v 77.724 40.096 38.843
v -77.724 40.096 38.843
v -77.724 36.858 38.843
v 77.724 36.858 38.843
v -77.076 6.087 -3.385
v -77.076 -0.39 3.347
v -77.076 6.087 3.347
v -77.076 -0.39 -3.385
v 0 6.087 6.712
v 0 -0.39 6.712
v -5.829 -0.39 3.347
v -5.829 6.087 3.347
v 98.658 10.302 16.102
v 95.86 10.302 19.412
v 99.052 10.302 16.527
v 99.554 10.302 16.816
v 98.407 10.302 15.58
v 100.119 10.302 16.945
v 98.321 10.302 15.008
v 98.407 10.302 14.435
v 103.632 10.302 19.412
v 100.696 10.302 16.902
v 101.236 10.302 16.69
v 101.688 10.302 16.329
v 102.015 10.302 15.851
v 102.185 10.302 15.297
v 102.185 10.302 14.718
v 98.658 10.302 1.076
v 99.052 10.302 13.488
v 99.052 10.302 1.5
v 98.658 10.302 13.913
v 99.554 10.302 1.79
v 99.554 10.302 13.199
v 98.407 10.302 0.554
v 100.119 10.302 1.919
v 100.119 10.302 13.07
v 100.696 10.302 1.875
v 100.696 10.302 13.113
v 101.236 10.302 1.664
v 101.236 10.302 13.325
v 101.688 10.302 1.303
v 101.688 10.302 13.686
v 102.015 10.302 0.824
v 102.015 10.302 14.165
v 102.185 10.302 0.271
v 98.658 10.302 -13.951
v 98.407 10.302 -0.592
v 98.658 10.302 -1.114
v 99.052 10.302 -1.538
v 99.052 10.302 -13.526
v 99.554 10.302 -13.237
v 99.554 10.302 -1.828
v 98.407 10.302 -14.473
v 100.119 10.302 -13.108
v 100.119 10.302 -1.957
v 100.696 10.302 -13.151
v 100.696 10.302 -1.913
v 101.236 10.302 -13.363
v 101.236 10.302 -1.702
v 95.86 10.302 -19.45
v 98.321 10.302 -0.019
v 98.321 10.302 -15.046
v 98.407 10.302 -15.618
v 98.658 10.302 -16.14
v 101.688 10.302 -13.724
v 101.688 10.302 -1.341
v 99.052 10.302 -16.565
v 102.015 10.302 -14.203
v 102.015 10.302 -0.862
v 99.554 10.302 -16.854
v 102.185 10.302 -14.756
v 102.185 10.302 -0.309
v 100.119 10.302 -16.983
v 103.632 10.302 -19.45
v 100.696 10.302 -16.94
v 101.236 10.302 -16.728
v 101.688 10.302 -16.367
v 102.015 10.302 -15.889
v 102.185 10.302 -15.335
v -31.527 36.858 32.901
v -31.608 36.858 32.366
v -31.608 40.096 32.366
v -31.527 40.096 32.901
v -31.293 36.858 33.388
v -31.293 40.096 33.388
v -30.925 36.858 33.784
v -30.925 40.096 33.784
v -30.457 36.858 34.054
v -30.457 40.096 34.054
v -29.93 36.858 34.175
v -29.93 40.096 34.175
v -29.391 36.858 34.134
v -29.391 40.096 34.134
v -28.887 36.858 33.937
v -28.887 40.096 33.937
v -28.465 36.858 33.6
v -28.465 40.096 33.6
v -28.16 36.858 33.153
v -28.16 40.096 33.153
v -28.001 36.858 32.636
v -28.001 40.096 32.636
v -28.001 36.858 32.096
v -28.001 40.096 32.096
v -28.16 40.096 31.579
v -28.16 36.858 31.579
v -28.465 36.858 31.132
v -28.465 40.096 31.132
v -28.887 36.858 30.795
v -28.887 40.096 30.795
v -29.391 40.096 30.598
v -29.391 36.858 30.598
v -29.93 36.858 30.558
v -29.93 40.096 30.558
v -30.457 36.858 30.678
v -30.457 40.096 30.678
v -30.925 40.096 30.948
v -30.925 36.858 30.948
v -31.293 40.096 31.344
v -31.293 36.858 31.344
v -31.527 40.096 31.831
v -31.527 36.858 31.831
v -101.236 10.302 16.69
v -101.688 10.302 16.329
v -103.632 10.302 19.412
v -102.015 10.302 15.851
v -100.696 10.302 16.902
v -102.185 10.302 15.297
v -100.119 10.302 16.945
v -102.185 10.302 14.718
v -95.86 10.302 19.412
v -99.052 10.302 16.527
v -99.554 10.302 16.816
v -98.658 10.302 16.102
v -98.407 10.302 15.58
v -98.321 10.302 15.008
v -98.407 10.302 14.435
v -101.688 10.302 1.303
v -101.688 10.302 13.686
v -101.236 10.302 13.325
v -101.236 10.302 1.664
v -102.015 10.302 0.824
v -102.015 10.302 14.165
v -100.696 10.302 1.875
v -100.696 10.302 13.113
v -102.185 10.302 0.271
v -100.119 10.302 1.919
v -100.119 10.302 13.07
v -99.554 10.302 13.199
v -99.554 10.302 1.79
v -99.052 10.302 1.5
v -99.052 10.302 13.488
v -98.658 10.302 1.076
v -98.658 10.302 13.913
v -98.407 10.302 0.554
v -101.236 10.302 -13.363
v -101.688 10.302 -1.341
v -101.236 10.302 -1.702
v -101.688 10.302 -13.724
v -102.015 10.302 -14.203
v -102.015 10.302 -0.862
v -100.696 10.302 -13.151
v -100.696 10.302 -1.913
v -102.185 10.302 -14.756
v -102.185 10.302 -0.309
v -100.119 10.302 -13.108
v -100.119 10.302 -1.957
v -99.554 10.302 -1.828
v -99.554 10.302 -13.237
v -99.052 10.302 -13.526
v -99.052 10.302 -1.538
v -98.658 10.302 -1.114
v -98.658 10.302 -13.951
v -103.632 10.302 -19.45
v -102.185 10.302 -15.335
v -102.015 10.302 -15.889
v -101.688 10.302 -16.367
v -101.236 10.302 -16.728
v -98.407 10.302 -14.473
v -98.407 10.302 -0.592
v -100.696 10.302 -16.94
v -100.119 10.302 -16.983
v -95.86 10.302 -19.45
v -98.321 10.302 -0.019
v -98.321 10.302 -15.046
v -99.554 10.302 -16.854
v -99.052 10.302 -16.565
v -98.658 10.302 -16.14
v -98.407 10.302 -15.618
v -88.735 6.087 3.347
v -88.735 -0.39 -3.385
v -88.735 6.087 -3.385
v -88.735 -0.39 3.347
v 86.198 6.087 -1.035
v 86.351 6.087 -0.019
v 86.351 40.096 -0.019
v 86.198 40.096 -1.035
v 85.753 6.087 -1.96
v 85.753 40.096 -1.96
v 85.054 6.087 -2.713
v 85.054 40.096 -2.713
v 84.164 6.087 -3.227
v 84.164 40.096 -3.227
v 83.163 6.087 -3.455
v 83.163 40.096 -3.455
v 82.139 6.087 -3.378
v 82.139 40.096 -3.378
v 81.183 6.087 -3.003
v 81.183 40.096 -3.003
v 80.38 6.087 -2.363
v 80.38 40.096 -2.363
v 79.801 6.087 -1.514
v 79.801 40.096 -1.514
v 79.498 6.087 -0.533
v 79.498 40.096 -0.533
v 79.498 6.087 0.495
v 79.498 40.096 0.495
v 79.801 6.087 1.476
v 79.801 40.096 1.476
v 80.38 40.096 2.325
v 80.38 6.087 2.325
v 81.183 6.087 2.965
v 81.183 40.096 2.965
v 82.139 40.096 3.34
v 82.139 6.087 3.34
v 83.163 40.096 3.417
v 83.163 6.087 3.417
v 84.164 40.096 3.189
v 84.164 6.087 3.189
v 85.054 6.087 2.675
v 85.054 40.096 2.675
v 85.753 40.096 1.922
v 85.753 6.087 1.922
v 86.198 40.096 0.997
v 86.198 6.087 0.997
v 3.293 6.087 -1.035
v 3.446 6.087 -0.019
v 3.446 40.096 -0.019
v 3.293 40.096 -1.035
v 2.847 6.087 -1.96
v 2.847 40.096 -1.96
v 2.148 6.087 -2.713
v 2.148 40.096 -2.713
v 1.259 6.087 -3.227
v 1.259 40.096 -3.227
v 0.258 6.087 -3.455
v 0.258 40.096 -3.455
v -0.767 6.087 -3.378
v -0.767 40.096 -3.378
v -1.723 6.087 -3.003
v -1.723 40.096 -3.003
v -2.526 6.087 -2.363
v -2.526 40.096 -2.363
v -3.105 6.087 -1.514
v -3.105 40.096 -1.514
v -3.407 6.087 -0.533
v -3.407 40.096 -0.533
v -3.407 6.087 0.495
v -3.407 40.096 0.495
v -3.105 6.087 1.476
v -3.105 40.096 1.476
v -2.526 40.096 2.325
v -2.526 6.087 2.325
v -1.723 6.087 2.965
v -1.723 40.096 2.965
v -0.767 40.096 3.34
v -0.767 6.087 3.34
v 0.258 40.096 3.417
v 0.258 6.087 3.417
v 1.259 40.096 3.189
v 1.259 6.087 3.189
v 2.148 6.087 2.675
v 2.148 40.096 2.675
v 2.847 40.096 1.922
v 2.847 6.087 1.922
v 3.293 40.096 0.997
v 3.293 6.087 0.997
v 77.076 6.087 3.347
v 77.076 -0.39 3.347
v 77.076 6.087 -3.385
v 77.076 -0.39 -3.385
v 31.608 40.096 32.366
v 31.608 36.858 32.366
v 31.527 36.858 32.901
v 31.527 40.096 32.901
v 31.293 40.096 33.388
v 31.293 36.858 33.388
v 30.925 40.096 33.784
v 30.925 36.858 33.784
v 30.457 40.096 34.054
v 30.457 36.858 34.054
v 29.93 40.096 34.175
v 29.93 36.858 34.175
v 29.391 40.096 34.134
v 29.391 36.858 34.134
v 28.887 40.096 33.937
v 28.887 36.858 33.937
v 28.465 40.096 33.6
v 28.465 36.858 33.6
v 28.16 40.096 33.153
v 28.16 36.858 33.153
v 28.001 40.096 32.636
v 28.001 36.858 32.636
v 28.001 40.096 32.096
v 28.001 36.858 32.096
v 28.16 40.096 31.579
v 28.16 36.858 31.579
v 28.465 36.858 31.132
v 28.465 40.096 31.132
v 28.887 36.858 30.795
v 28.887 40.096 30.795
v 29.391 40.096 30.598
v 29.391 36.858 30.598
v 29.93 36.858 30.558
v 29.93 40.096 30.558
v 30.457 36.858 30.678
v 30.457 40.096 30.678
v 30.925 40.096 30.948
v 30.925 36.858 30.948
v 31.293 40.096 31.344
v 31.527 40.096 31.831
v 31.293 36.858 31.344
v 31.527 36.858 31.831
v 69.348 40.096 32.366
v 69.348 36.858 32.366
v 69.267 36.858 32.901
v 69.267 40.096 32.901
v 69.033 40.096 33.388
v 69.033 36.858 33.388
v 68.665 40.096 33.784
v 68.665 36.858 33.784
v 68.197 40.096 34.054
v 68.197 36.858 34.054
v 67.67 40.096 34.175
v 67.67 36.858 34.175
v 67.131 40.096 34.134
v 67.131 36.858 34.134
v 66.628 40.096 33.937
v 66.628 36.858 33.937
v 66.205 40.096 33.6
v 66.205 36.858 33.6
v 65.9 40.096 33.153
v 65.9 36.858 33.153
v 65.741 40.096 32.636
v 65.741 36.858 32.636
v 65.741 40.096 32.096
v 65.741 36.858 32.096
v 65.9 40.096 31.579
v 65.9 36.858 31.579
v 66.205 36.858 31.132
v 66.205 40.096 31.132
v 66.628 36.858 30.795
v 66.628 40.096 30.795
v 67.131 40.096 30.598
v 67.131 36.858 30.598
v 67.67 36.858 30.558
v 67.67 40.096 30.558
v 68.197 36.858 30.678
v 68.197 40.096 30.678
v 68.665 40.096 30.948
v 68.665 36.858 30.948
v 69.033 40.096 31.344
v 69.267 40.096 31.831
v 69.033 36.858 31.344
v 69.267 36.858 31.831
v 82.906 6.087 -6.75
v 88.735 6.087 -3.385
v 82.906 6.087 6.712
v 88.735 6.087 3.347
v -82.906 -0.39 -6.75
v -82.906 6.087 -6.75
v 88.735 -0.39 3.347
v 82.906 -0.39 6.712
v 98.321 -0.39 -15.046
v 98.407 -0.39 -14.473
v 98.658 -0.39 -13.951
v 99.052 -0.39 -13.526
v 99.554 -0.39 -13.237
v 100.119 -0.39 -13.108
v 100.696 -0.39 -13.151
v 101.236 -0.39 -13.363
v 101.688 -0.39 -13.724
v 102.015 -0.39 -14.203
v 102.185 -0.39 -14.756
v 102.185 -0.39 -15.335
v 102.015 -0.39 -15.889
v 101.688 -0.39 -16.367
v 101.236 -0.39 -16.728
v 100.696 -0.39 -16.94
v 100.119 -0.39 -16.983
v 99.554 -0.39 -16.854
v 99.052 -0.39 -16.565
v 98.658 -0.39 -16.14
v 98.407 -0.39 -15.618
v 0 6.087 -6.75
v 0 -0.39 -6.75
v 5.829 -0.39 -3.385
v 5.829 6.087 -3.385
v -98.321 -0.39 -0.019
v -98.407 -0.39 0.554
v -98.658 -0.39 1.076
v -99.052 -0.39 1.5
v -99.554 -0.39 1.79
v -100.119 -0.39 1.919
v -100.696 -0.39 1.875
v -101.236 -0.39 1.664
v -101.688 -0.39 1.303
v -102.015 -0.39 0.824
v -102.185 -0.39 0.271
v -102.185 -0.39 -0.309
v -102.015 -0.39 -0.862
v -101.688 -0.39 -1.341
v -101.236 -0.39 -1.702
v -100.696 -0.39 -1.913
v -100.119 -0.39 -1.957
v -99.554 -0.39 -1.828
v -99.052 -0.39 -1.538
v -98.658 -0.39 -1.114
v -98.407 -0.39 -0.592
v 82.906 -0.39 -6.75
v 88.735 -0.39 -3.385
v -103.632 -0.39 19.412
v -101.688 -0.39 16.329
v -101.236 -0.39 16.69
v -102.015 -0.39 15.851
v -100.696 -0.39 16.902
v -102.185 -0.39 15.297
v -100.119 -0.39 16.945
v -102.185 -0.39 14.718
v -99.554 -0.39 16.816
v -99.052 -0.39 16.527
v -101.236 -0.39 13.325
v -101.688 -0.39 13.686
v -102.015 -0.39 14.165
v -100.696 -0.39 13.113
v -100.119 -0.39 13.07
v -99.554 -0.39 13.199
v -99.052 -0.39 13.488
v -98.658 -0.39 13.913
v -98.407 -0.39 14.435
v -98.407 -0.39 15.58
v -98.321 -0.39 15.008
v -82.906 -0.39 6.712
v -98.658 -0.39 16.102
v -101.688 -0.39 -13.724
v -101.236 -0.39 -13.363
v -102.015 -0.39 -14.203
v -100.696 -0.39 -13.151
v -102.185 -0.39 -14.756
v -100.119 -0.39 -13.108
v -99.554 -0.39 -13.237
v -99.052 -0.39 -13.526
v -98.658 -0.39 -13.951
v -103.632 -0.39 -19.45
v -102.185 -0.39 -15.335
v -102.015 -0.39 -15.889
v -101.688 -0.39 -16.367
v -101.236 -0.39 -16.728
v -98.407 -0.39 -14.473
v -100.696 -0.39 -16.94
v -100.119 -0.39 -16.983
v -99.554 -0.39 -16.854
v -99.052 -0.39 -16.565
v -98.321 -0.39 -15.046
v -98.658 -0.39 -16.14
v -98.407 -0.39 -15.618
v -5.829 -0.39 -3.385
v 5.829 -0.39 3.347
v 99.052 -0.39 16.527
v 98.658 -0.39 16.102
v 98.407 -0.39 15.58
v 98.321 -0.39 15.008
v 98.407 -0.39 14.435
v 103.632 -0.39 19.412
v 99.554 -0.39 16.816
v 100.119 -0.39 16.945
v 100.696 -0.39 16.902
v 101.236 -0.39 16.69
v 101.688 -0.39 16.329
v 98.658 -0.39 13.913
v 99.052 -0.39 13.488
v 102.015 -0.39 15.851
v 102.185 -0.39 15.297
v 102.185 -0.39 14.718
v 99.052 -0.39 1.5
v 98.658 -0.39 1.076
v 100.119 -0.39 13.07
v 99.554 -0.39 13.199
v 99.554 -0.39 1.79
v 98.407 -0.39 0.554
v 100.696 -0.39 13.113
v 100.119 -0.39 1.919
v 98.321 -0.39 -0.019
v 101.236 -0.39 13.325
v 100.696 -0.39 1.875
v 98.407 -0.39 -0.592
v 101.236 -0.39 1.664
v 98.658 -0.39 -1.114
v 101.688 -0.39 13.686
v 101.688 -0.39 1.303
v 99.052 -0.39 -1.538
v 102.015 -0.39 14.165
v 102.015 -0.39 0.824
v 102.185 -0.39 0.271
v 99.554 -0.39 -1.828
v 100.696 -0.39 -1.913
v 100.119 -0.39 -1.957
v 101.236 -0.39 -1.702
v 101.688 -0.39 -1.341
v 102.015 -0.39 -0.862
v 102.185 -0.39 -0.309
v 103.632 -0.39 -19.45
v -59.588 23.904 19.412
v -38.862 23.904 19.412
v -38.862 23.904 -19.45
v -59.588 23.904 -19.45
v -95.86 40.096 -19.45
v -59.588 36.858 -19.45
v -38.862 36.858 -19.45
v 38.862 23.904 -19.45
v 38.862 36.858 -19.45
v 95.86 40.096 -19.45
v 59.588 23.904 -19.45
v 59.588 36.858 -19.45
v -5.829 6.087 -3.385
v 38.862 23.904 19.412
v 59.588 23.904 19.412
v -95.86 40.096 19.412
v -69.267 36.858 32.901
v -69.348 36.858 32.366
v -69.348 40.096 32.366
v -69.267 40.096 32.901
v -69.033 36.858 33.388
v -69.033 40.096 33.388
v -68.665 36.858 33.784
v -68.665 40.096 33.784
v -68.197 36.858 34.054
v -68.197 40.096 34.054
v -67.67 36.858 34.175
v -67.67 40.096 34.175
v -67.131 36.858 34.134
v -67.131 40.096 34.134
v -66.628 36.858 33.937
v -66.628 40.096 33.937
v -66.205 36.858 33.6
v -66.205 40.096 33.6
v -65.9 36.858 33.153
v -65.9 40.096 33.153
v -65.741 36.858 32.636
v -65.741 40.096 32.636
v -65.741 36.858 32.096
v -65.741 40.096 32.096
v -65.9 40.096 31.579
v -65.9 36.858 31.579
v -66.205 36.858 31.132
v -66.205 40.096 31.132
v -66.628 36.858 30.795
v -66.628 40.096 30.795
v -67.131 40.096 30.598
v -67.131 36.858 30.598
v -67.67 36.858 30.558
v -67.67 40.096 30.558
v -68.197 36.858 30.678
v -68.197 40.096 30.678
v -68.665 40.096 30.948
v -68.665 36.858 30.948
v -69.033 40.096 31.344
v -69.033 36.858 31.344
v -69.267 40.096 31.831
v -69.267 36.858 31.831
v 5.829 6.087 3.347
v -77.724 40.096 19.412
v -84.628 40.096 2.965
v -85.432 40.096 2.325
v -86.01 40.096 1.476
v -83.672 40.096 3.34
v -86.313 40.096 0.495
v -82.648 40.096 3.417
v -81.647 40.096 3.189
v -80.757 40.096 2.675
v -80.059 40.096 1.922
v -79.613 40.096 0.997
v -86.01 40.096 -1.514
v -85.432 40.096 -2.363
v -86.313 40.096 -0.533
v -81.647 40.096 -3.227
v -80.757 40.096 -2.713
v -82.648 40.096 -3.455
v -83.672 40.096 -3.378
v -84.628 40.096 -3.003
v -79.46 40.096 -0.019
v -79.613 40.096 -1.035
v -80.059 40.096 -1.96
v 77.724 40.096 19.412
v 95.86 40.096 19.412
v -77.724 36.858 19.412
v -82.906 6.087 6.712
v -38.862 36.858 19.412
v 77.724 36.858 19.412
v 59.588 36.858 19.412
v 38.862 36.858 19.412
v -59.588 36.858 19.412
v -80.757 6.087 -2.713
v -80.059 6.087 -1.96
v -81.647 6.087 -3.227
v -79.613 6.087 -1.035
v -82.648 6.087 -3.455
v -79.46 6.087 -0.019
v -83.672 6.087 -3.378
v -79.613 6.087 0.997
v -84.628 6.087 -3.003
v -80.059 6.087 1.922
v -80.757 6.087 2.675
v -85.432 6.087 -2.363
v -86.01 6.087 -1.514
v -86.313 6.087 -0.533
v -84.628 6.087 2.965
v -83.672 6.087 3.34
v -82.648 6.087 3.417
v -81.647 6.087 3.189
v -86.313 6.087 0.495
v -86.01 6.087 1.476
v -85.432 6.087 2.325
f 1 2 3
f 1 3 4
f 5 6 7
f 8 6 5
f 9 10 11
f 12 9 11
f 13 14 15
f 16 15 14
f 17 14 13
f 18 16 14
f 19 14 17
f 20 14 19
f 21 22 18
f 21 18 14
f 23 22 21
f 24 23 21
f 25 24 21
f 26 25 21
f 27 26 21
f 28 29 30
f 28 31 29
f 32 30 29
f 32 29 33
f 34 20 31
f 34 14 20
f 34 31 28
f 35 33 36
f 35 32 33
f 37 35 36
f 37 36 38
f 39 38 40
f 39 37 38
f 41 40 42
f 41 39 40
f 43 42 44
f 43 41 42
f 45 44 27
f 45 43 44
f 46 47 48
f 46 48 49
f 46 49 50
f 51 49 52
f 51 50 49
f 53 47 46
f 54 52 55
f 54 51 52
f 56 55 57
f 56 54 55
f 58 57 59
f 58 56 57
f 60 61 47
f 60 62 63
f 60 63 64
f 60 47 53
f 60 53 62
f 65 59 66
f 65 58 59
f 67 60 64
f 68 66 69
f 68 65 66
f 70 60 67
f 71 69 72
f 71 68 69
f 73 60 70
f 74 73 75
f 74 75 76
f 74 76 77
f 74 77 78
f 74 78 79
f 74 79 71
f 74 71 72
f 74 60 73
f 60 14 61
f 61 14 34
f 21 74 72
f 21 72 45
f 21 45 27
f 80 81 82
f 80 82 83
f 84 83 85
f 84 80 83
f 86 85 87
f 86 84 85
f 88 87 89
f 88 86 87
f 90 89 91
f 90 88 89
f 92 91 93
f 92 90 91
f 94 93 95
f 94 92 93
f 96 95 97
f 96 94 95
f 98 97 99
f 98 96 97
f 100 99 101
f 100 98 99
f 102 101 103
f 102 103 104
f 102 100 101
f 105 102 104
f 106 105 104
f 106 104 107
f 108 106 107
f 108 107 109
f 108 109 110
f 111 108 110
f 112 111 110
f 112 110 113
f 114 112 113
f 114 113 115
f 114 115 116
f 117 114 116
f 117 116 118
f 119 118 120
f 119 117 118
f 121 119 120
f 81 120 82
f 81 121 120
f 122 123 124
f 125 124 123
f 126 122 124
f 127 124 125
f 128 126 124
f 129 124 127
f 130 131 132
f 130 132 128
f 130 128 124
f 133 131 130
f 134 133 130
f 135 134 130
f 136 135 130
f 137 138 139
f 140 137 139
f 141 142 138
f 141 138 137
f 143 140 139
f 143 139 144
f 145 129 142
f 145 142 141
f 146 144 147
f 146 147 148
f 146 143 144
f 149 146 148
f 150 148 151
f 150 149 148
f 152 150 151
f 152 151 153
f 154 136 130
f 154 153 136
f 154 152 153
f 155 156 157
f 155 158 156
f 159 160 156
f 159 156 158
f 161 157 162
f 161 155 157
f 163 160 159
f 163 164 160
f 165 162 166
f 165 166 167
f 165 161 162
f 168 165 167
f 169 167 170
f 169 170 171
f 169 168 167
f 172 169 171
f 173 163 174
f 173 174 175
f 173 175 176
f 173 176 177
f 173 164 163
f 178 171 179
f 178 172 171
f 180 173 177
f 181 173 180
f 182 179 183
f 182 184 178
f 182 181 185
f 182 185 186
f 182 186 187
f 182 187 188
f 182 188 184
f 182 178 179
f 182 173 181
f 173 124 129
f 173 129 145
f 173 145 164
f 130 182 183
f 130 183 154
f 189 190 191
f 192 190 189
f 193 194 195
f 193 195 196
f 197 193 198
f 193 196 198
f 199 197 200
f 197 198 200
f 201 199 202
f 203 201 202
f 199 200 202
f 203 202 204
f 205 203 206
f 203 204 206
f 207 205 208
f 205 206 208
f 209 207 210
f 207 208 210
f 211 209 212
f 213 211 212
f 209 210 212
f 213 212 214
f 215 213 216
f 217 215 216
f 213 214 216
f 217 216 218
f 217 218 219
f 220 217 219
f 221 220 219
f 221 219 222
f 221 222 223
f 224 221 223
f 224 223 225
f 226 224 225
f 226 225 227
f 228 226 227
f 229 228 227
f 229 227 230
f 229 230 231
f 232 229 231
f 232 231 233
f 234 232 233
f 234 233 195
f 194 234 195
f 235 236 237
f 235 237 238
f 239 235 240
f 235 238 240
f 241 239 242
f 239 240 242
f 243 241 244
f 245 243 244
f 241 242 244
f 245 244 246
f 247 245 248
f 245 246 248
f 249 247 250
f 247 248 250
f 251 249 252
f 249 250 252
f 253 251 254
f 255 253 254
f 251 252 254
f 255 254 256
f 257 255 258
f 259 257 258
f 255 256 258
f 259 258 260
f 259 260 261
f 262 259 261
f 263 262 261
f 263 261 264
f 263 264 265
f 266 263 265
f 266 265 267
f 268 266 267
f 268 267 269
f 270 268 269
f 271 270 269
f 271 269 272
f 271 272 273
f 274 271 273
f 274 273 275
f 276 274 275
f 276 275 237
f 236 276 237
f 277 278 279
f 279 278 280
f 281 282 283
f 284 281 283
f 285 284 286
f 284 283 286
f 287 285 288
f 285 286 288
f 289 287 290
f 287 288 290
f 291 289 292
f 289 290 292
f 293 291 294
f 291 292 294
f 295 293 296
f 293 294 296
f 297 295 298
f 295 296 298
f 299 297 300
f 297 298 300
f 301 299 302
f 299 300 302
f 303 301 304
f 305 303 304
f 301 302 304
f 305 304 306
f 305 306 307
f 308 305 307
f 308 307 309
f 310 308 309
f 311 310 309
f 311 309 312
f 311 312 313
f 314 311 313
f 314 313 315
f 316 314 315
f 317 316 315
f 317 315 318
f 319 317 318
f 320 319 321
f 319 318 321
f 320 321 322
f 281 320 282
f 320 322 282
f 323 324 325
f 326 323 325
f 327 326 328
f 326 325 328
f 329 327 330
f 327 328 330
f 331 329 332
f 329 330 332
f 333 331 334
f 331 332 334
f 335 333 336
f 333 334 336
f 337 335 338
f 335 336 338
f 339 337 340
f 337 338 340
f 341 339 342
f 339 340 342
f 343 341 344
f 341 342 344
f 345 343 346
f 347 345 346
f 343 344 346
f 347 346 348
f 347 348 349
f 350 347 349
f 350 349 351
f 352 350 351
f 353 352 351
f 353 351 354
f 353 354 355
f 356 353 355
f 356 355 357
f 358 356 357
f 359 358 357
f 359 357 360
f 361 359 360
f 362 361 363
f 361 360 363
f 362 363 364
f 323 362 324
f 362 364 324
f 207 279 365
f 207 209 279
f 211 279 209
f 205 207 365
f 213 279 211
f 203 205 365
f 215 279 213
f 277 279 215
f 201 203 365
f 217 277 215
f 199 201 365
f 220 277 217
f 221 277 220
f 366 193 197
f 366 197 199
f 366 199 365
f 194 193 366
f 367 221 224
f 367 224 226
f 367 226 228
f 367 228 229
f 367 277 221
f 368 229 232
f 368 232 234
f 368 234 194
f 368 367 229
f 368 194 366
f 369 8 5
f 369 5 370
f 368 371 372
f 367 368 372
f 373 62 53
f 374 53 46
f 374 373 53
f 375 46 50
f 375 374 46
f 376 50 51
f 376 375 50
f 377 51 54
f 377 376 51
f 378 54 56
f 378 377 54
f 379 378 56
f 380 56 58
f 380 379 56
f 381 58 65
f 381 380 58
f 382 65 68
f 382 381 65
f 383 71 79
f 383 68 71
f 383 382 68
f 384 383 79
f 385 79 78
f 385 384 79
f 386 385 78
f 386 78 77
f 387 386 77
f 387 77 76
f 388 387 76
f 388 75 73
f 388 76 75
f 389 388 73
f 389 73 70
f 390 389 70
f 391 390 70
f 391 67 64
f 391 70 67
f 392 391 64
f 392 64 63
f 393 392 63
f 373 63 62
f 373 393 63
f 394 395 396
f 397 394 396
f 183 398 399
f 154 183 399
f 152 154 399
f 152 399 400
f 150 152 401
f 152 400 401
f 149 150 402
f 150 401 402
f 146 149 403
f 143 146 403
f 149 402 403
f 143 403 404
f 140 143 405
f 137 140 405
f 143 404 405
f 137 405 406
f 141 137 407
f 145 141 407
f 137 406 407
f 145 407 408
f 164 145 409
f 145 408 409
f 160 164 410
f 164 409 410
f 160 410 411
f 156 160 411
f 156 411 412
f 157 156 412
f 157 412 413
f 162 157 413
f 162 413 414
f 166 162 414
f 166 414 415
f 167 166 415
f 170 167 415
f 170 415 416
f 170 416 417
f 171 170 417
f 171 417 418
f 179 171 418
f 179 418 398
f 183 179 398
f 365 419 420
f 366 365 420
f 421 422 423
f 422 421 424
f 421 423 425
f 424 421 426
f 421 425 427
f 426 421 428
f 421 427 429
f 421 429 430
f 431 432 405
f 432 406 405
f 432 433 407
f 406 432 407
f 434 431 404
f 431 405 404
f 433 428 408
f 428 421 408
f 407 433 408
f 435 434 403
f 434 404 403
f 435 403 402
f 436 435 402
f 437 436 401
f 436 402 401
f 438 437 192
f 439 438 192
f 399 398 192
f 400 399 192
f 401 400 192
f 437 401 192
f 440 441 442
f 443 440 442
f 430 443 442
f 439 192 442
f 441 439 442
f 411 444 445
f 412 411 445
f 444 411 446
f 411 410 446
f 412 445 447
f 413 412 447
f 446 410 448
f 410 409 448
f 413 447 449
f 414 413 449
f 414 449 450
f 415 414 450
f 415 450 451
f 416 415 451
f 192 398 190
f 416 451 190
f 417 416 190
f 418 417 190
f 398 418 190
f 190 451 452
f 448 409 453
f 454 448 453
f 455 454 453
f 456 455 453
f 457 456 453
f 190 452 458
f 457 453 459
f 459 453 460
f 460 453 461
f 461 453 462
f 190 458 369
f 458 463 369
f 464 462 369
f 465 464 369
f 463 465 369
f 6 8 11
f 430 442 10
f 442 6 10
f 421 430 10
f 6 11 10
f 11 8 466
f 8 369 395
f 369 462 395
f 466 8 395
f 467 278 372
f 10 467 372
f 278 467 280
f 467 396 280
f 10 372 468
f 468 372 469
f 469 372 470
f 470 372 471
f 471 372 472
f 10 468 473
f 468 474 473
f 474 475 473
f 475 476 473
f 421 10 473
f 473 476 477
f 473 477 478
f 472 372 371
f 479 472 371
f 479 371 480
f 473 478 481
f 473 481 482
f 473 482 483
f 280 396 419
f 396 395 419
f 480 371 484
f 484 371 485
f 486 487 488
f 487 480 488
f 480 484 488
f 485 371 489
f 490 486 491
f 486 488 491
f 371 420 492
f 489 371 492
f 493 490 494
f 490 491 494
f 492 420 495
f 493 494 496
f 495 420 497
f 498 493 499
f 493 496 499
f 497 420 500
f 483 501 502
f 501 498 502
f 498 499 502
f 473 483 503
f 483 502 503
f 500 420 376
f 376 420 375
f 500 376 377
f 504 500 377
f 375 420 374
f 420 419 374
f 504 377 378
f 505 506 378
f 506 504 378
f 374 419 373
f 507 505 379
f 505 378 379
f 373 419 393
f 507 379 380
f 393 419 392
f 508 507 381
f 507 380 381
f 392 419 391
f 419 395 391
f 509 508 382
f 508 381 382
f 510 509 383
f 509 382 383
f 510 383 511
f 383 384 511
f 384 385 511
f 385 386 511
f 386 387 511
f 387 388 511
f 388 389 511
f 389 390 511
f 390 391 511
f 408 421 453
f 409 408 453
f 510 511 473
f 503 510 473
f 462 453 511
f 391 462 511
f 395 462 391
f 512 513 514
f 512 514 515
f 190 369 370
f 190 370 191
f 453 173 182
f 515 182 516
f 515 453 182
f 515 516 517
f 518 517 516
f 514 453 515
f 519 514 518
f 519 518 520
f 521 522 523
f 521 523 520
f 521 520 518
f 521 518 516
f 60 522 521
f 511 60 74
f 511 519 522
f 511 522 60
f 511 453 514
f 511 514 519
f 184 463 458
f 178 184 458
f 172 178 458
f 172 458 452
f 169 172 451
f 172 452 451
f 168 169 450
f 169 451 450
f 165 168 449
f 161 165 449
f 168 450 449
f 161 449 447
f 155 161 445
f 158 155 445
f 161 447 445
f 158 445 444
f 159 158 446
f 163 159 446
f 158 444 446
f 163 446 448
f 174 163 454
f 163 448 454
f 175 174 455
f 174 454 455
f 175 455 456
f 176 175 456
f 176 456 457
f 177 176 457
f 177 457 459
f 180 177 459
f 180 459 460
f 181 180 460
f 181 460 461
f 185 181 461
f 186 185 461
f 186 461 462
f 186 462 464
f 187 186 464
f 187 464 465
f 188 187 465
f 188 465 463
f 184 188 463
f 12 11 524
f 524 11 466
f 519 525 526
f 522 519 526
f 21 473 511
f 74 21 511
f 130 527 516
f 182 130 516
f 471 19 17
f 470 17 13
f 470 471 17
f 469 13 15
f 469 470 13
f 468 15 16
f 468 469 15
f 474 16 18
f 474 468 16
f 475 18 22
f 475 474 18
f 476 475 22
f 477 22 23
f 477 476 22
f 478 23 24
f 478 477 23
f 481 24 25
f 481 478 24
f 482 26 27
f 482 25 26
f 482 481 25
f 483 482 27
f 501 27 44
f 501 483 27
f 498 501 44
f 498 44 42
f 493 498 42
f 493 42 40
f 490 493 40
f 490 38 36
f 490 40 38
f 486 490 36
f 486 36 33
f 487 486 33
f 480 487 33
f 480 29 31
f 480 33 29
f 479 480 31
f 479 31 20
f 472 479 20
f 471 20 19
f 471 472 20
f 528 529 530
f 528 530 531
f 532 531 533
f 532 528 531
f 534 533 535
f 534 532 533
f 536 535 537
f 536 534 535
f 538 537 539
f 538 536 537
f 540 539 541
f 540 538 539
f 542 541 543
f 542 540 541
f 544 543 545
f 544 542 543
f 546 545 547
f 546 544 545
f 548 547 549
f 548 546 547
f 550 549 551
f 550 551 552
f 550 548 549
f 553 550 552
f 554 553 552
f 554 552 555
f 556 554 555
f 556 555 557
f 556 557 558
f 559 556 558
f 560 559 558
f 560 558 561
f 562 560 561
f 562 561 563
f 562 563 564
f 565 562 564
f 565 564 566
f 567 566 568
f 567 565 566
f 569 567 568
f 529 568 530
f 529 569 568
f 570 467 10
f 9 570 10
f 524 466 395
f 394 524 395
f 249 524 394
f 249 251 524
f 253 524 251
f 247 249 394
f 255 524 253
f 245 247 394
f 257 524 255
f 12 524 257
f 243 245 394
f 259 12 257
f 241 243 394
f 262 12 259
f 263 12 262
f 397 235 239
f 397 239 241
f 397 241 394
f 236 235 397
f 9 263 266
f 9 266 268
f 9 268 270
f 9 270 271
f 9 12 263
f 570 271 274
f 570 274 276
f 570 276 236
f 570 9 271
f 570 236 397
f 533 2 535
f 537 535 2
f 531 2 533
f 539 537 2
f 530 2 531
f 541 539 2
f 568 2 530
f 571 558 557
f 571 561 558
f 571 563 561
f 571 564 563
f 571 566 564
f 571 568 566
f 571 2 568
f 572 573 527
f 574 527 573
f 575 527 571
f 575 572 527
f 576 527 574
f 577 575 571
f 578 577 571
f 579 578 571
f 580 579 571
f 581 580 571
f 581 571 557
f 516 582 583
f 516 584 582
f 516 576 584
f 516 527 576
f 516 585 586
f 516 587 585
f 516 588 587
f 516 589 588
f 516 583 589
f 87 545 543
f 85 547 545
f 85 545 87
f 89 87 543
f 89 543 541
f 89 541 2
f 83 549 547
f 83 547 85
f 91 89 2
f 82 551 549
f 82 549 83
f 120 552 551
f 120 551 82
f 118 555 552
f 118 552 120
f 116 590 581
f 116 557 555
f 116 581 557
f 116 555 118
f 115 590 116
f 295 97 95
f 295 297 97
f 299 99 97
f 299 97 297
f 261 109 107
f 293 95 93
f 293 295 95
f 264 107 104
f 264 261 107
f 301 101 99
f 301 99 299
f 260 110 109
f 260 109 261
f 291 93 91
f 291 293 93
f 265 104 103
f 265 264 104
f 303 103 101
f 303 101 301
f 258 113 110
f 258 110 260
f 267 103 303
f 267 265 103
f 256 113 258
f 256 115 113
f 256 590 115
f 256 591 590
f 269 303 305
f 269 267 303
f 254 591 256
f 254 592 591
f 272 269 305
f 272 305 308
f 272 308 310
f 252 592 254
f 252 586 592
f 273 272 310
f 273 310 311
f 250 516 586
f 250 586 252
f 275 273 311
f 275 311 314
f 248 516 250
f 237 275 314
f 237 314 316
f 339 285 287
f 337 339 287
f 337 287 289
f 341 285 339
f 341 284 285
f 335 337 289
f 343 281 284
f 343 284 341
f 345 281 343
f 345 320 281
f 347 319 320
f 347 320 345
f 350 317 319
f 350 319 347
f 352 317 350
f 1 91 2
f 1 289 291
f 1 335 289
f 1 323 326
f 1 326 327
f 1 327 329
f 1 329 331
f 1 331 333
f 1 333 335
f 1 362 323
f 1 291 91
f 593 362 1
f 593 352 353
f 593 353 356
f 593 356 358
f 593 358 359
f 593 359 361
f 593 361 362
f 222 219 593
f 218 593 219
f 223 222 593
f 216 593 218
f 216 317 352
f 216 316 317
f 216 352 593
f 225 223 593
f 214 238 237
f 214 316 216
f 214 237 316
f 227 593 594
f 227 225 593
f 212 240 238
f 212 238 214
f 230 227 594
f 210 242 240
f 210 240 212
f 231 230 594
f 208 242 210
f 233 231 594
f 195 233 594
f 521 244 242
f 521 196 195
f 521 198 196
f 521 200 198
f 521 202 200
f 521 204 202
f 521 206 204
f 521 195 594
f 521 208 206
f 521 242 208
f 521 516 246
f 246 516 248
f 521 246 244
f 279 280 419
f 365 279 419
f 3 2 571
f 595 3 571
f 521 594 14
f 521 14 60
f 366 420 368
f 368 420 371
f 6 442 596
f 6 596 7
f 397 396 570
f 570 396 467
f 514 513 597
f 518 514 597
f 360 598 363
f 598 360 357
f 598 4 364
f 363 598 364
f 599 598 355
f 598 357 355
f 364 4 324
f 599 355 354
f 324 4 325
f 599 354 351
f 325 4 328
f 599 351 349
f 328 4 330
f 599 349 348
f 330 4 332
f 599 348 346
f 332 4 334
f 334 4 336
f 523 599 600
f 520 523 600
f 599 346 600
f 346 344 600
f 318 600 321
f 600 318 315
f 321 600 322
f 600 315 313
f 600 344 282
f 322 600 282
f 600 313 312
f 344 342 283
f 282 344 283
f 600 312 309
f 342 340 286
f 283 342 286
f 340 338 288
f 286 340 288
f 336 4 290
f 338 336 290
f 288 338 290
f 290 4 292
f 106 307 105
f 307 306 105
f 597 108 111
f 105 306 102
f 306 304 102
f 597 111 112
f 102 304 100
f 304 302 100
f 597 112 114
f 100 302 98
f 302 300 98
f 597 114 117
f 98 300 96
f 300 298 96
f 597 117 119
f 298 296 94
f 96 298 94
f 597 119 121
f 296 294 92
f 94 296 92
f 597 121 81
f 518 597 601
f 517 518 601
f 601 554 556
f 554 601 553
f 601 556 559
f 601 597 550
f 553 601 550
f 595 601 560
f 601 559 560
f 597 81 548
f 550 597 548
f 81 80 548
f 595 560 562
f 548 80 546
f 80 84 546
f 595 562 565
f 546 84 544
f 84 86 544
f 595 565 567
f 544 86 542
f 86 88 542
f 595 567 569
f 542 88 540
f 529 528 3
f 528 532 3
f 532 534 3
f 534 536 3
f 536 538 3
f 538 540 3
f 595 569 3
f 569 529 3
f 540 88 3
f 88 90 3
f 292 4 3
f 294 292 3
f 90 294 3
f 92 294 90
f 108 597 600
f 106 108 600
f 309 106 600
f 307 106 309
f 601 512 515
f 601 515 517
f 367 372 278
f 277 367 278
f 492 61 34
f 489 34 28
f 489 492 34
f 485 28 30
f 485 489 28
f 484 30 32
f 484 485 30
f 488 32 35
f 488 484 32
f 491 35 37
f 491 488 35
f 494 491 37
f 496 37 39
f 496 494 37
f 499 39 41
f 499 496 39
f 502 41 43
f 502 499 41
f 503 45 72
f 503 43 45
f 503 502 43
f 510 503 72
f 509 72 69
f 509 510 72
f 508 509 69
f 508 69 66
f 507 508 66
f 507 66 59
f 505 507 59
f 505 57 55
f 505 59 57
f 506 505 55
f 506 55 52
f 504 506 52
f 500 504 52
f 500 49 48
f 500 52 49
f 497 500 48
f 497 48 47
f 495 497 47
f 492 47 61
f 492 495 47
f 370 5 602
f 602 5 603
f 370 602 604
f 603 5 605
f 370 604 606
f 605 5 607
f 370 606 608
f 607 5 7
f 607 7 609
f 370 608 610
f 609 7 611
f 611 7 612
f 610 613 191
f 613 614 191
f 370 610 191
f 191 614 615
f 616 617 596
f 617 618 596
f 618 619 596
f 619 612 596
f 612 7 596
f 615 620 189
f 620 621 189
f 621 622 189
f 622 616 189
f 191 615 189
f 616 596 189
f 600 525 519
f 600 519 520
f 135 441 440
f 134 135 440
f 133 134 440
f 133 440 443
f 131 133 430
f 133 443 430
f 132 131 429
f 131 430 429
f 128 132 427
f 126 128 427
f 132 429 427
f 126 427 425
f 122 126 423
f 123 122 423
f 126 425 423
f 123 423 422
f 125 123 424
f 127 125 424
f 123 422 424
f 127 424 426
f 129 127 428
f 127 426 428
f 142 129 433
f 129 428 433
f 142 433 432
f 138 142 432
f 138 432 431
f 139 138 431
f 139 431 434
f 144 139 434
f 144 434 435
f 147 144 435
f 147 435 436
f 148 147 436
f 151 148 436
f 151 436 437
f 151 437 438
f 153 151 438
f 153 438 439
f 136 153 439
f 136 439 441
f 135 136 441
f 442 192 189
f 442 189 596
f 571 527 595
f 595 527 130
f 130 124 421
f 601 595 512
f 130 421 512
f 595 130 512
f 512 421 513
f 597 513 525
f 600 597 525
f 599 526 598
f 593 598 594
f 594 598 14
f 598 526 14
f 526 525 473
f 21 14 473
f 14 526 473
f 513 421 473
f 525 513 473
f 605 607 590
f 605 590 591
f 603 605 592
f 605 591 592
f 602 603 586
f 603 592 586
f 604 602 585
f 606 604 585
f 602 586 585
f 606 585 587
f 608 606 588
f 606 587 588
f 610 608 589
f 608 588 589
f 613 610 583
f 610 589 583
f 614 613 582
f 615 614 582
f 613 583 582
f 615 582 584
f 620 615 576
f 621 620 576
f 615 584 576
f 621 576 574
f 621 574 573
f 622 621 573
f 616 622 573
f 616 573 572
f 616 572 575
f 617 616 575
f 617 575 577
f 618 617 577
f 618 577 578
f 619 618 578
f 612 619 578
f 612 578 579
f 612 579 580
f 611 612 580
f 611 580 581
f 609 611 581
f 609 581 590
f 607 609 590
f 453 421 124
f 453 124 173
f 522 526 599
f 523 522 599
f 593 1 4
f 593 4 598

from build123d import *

# Parameters (mm, degrees)
SKETCH1_W           = 203.2
SKETCH1_H           = 38.1
BOSS_EXTRUDE1_DEPTH = 39.69258
SKETCH3_R           = 1.905
CUT_EXTRUDE1_DEPTH  = 40.69258
SKETCH4_R           = 3.3782
CUT_EXTRUDE3_DEPTH  = 40.69258
CUT_EXTRUDE5_DEPTH  = 6.35
SKETCH7_W           = 7.62
SKETCH7_H           = 38.1
CUT_EXTRUDE6_DEPTH  = 29.21
SKETCH8_W           = 152.4
SKETCH8_H           = 19.05
BOSS_EXTRUDE2_DEPTH = 3.175
SKETCH9_R           = 1.778
CUT_EXTRUDE7_DEPTH  = 3.175
SKETCH10_W          = 20.32
SKETCH10_H          = 12.7
CUT_EXTRUDE8_DEPTH  = 38.1
SCALE1_SCALE        = 1.02


with BuildPart() as part:
    # Sketch1 → Boss-Extrude1 (new body)
    with BuildSketch(Plane(origin=(0, 0, 0), x_dir=(1, 0, 0), z_dir=(0, 1, 0))):
        Rectangle(SKETCH1_W, SKETCH1_H)
    extrude(amount=BOSS_EXTRUDE1_DEPTH)

    # Sketch3 → Cut-Extrude1 (cut, through all)
    with BuildSketch(Plane.XZ):
        with Locations((-98.298, 14.732)):
            Circle(SKETCH3_R)
        with Locations((-98.298, 0)):
            Circle(SKETCH3_R)
        with Locations((-98.298, -14.732)):
            Circle(SKETCH3_R)
    cut_extrude1 = extrude(amount=-CUT_EXTRUDE1_DEPTH, mode=Mode.SUBTRACT)

    # Mirror1: Cut-Extrude1 across plane
    add(cut_extrude1.mirror(Plane(origin=(0, 0, 0), x_dir=(0, 0, 1), z_dir=(1, 0, 0))), mode=Mode.SUBTRACT)

    # Sketch4 → Cut-Extrude3 (cut, through all)
    with BuildSketch(Plane(origin=(0, 39.69258, 0), x_dir=(1, 0, 0), z_dir=(0, 1, 0))):
        Circle(SKETCH4_R)
        with Locations((81.28, 0)):
            Circle(SKETCH4_R)
        with Locations((-81.28, 0)):
            Circle(SKETCH4_R)
    extrude(amount=-CUT_EXTRUDE3_DEPTH, mode=Mode.SUBTRACT)

    # Sketch6 → Cut-Extrude5 (cut)
    with BuildSketch(Plane.XZ):
        Polygon((86.995, 3.299556788), (81.28, 6.599113577), (75.565, 3.299556788), (75.565, -3.299556788), (81.28, -6.599113577), (86.995, -3.299556788), align=None)
        Polygon((-86.995, -3.299556788), (-86.995, 3.299556788), (-81.28, 6.599113577), (-75.565, 3.299556788), (-75.565, -3.299556788), (-81.28, -6.599113577), align=None)
        Polygon((5.715, 3.299556788), (0, 6.599113577), (-5.715, 3.299556788), (-5.715, -3.299556788), (0, -6.599113577), (5.715, -3.299556788), align=None)
    extrude(amount=-CUT_EXTRUDE5_DEPTH, mode=Mode.SUBTRACT)

    # Sketch7 → Cut-Extrude6 (cut)
    with BuildSketch(Plane(origin=(0, 39.69258, 0), x_dir=(1, 0, 0), z_dir=(0, 1, 0))):
        with Locations((-97.79, 0)):
            Rectangle(SKETCH7_W, SKETCH7_H)
        with Locations((97.79, 0)):
            Rectangle(SKETCH7_W, SKETCH7_H)
    extrude(amount=-CUT_EXTRUDE6_DEPTH, mode=Mode.SUBTRACT)

    # Sketch8 → Boss-Extrude2 (add)
    with BuildSketch(Plane(origin=(0, 39.69258, 0), x_dir=(1, 0, 0), z_dir=(0, 1, 0))):
        with Locations((0, -28.575)):
            Rectangle(SKETCH8_W, SKETCH8_H)
    extrude(amount=-BOSS_EXTRUDE2_DEPTH)

    # Sketch9 → Cut-Extrude7 (cut)
    with BuildSketch(Plane.XZ.offset(-36.51758)):
        with Locations((29.21, 31.75)):
            Circle(SKETCH9_R)
        with Locations((66.21018, 31.75)):
            Circle(SKETCH9_R)
    cut_extrude7 = extrude(amount=-CUT_EXTRUDE7_DEPTH, mode=Mode.SUBTRACT)

    # Mirror2: Cut-Extrude7 across plane
    add(cut_extrude7.mirror(Plane(origin=(0, 0, 0), x_dir=(0, 0, 1), z_dir=(1, 0, 0))), mode=Mode.SUBTRACT)

    # Sketch10 → Cut-Extrude8 (cut)
    with BuildSketch(Plane.XY.offset(19.05)):
        with Locations((48.26, 30.16758)):
            Rectangle(SKETCH10_W, SKETCH10_H)
    cut_extrude8 = extrude(amount=-CUT_EXTRUDE8_DEPTH, mode=Mode.SUBTRACT)

    # Mirror3: Cut-Extrude8 across plane
    add(cut_extrude8.mirror(Plane(origin=(0, 0, 0), x_dir=(0, 0, 1), z_dir=(1, 0, 0))), mode=Mode.SUBTRACT)


with BuildPart() as part_1:
    # Scale1: scaled about (0, 19.51392143, 0.949094237)
    add(part.part.scale(SCALE1_SCALE).moved(Location((0, -0.390278429, -0.018981885))))


solid = part_1.part
